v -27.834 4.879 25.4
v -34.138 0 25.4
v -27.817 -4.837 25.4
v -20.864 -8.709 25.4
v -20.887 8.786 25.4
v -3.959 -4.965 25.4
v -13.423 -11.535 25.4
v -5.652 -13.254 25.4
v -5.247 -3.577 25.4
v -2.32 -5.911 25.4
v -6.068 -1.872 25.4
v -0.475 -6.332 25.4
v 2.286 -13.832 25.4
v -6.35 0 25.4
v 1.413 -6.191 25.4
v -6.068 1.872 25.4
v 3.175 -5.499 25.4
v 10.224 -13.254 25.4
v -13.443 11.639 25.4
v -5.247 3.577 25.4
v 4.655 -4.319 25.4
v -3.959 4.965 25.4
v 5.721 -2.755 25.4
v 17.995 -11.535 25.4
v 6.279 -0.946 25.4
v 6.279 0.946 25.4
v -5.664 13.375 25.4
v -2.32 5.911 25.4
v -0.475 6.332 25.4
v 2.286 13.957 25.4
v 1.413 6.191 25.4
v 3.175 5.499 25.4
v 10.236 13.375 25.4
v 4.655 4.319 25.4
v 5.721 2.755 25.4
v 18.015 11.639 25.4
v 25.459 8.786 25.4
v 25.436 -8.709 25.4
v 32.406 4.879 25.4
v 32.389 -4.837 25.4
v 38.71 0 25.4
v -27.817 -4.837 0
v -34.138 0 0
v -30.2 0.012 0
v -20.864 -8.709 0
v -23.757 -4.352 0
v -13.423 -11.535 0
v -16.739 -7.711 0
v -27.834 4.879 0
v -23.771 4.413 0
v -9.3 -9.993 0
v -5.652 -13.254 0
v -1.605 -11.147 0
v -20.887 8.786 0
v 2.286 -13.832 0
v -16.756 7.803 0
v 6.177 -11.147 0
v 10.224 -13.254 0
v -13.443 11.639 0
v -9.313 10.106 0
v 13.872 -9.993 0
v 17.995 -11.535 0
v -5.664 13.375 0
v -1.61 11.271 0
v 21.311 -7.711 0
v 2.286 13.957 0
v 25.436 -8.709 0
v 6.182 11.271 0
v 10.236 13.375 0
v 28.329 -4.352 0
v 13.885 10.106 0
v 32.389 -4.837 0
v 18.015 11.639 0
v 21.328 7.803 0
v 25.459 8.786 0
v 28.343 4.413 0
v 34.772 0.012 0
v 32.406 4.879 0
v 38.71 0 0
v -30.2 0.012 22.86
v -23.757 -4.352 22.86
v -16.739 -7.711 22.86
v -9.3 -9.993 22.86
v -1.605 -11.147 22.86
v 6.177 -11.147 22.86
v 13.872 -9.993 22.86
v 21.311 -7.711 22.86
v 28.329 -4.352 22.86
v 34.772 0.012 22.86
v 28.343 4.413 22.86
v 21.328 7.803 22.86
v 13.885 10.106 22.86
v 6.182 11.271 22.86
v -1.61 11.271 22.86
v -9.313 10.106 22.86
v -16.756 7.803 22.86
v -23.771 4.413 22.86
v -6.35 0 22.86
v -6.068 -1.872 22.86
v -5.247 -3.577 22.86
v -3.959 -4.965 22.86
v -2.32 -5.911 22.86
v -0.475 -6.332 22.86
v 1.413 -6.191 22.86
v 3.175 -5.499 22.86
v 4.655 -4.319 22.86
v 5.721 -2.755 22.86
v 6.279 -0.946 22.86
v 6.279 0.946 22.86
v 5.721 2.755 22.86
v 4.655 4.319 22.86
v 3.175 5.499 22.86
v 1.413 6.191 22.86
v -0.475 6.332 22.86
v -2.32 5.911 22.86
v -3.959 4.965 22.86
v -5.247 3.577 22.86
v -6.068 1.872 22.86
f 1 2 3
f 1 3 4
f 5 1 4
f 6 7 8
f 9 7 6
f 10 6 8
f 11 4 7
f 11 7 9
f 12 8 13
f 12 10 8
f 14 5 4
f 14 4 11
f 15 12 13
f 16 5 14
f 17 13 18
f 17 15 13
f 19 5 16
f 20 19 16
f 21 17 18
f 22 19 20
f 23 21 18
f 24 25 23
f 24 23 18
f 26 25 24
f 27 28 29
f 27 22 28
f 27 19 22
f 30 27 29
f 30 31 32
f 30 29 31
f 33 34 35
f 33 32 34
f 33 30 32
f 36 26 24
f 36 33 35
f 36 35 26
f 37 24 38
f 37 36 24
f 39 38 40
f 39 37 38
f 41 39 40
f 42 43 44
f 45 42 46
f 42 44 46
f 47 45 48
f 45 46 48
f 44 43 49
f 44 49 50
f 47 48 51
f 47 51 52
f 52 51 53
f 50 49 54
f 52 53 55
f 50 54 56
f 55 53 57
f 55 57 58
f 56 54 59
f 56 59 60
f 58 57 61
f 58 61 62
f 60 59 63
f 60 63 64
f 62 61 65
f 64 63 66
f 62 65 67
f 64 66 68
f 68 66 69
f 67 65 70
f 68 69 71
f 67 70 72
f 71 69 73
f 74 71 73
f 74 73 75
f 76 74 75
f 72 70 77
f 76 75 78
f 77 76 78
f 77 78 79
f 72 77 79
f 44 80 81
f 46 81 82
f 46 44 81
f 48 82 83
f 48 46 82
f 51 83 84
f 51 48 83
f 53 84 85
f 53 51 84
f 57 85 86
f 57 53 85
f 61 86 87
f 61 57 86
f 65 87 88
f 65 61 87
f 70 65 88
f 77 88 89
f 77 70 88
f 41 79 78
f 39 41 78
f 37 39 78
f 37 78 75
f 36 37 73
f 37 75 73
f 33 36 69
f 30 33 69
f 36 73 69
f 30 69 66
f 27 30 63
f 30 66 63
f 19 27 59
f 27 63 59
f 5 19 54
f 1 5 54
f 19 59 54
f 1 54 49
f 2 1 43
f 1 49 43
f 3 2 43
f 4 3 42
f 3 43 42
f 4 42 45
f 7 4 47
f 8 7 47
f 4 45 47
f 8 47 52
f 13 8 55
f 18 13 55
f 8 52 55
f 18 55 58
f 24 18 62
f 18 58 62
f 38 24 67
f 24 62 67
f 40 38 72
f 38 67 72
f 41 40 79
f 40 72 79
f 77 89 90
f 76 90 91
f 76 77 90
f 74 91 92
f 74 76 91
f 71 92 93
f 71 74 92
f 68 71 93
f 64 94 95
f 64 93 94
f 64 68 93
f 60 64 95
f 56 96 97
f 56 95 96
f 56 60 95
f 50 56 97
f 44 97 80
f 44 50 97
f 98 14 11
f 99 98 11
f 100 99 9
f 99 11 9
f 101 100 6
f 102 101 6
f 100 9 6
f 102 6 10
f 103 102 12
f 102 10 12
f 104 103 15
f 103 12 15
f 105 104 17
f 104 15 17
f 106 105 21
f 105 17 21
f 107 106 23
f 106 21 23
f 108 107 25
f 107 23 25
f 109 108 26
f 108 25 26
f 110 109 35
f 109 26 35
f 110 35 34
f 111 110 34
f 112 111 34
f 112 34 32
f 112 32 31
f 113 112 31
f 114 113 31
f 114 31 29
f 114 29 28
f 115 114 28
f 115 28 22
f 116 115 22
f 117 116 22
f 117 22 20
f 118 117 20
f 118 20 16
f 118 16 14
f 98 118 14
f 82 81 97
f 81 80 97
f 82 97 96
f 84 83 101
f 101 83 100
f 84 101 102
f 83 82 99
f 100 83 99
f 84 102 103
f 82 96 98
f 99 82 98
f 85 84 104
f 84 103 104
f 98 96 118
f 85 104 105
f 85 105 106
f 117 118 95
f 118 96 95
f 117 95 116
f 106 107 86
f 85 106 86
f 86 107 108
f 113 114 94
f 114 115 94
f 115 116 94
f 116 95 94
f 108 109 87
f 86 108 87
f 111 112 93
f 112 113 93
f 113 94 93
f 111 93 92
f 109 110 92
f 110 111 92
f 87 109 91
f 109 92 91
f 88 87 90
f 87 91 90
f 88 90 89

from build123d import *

# Parameters (mm, degrees)
F1_DEPTH = 25.4
F2_T     = -2.54
F4_D     = 12.7


with BuildPart() as f1:
    # F0 (on Top) → F1 (new body)
    with BuildSketch(Plane.XY):
        with BuildLine():
            ThreePointArc((-34.137599, 0), (2.286002, -13.83152), (38.709603, 0))
            ThreePointArc((38.709603, 0), (2.286002, 13.957497), (-34.137599, 0))
        make_face()
    extrude(amount=F1_DEPTH)

    # F2
    f2_openings = [f1.faces().sort_by_distance(p)[0] for p in [
        (2.286002, 0.052928, 0),
    ]]
    offset(amount=F2_T, openings=f2_openings)

    # F4 (through all)
    with Locations(Plane(origin=(0, 0, 0), x_dir=(1, 0, 0), z_dir=(0, 0, -1))):
        with Locations((0, 0)):
            Hole(F4_D / 2)


solid = f1.part
